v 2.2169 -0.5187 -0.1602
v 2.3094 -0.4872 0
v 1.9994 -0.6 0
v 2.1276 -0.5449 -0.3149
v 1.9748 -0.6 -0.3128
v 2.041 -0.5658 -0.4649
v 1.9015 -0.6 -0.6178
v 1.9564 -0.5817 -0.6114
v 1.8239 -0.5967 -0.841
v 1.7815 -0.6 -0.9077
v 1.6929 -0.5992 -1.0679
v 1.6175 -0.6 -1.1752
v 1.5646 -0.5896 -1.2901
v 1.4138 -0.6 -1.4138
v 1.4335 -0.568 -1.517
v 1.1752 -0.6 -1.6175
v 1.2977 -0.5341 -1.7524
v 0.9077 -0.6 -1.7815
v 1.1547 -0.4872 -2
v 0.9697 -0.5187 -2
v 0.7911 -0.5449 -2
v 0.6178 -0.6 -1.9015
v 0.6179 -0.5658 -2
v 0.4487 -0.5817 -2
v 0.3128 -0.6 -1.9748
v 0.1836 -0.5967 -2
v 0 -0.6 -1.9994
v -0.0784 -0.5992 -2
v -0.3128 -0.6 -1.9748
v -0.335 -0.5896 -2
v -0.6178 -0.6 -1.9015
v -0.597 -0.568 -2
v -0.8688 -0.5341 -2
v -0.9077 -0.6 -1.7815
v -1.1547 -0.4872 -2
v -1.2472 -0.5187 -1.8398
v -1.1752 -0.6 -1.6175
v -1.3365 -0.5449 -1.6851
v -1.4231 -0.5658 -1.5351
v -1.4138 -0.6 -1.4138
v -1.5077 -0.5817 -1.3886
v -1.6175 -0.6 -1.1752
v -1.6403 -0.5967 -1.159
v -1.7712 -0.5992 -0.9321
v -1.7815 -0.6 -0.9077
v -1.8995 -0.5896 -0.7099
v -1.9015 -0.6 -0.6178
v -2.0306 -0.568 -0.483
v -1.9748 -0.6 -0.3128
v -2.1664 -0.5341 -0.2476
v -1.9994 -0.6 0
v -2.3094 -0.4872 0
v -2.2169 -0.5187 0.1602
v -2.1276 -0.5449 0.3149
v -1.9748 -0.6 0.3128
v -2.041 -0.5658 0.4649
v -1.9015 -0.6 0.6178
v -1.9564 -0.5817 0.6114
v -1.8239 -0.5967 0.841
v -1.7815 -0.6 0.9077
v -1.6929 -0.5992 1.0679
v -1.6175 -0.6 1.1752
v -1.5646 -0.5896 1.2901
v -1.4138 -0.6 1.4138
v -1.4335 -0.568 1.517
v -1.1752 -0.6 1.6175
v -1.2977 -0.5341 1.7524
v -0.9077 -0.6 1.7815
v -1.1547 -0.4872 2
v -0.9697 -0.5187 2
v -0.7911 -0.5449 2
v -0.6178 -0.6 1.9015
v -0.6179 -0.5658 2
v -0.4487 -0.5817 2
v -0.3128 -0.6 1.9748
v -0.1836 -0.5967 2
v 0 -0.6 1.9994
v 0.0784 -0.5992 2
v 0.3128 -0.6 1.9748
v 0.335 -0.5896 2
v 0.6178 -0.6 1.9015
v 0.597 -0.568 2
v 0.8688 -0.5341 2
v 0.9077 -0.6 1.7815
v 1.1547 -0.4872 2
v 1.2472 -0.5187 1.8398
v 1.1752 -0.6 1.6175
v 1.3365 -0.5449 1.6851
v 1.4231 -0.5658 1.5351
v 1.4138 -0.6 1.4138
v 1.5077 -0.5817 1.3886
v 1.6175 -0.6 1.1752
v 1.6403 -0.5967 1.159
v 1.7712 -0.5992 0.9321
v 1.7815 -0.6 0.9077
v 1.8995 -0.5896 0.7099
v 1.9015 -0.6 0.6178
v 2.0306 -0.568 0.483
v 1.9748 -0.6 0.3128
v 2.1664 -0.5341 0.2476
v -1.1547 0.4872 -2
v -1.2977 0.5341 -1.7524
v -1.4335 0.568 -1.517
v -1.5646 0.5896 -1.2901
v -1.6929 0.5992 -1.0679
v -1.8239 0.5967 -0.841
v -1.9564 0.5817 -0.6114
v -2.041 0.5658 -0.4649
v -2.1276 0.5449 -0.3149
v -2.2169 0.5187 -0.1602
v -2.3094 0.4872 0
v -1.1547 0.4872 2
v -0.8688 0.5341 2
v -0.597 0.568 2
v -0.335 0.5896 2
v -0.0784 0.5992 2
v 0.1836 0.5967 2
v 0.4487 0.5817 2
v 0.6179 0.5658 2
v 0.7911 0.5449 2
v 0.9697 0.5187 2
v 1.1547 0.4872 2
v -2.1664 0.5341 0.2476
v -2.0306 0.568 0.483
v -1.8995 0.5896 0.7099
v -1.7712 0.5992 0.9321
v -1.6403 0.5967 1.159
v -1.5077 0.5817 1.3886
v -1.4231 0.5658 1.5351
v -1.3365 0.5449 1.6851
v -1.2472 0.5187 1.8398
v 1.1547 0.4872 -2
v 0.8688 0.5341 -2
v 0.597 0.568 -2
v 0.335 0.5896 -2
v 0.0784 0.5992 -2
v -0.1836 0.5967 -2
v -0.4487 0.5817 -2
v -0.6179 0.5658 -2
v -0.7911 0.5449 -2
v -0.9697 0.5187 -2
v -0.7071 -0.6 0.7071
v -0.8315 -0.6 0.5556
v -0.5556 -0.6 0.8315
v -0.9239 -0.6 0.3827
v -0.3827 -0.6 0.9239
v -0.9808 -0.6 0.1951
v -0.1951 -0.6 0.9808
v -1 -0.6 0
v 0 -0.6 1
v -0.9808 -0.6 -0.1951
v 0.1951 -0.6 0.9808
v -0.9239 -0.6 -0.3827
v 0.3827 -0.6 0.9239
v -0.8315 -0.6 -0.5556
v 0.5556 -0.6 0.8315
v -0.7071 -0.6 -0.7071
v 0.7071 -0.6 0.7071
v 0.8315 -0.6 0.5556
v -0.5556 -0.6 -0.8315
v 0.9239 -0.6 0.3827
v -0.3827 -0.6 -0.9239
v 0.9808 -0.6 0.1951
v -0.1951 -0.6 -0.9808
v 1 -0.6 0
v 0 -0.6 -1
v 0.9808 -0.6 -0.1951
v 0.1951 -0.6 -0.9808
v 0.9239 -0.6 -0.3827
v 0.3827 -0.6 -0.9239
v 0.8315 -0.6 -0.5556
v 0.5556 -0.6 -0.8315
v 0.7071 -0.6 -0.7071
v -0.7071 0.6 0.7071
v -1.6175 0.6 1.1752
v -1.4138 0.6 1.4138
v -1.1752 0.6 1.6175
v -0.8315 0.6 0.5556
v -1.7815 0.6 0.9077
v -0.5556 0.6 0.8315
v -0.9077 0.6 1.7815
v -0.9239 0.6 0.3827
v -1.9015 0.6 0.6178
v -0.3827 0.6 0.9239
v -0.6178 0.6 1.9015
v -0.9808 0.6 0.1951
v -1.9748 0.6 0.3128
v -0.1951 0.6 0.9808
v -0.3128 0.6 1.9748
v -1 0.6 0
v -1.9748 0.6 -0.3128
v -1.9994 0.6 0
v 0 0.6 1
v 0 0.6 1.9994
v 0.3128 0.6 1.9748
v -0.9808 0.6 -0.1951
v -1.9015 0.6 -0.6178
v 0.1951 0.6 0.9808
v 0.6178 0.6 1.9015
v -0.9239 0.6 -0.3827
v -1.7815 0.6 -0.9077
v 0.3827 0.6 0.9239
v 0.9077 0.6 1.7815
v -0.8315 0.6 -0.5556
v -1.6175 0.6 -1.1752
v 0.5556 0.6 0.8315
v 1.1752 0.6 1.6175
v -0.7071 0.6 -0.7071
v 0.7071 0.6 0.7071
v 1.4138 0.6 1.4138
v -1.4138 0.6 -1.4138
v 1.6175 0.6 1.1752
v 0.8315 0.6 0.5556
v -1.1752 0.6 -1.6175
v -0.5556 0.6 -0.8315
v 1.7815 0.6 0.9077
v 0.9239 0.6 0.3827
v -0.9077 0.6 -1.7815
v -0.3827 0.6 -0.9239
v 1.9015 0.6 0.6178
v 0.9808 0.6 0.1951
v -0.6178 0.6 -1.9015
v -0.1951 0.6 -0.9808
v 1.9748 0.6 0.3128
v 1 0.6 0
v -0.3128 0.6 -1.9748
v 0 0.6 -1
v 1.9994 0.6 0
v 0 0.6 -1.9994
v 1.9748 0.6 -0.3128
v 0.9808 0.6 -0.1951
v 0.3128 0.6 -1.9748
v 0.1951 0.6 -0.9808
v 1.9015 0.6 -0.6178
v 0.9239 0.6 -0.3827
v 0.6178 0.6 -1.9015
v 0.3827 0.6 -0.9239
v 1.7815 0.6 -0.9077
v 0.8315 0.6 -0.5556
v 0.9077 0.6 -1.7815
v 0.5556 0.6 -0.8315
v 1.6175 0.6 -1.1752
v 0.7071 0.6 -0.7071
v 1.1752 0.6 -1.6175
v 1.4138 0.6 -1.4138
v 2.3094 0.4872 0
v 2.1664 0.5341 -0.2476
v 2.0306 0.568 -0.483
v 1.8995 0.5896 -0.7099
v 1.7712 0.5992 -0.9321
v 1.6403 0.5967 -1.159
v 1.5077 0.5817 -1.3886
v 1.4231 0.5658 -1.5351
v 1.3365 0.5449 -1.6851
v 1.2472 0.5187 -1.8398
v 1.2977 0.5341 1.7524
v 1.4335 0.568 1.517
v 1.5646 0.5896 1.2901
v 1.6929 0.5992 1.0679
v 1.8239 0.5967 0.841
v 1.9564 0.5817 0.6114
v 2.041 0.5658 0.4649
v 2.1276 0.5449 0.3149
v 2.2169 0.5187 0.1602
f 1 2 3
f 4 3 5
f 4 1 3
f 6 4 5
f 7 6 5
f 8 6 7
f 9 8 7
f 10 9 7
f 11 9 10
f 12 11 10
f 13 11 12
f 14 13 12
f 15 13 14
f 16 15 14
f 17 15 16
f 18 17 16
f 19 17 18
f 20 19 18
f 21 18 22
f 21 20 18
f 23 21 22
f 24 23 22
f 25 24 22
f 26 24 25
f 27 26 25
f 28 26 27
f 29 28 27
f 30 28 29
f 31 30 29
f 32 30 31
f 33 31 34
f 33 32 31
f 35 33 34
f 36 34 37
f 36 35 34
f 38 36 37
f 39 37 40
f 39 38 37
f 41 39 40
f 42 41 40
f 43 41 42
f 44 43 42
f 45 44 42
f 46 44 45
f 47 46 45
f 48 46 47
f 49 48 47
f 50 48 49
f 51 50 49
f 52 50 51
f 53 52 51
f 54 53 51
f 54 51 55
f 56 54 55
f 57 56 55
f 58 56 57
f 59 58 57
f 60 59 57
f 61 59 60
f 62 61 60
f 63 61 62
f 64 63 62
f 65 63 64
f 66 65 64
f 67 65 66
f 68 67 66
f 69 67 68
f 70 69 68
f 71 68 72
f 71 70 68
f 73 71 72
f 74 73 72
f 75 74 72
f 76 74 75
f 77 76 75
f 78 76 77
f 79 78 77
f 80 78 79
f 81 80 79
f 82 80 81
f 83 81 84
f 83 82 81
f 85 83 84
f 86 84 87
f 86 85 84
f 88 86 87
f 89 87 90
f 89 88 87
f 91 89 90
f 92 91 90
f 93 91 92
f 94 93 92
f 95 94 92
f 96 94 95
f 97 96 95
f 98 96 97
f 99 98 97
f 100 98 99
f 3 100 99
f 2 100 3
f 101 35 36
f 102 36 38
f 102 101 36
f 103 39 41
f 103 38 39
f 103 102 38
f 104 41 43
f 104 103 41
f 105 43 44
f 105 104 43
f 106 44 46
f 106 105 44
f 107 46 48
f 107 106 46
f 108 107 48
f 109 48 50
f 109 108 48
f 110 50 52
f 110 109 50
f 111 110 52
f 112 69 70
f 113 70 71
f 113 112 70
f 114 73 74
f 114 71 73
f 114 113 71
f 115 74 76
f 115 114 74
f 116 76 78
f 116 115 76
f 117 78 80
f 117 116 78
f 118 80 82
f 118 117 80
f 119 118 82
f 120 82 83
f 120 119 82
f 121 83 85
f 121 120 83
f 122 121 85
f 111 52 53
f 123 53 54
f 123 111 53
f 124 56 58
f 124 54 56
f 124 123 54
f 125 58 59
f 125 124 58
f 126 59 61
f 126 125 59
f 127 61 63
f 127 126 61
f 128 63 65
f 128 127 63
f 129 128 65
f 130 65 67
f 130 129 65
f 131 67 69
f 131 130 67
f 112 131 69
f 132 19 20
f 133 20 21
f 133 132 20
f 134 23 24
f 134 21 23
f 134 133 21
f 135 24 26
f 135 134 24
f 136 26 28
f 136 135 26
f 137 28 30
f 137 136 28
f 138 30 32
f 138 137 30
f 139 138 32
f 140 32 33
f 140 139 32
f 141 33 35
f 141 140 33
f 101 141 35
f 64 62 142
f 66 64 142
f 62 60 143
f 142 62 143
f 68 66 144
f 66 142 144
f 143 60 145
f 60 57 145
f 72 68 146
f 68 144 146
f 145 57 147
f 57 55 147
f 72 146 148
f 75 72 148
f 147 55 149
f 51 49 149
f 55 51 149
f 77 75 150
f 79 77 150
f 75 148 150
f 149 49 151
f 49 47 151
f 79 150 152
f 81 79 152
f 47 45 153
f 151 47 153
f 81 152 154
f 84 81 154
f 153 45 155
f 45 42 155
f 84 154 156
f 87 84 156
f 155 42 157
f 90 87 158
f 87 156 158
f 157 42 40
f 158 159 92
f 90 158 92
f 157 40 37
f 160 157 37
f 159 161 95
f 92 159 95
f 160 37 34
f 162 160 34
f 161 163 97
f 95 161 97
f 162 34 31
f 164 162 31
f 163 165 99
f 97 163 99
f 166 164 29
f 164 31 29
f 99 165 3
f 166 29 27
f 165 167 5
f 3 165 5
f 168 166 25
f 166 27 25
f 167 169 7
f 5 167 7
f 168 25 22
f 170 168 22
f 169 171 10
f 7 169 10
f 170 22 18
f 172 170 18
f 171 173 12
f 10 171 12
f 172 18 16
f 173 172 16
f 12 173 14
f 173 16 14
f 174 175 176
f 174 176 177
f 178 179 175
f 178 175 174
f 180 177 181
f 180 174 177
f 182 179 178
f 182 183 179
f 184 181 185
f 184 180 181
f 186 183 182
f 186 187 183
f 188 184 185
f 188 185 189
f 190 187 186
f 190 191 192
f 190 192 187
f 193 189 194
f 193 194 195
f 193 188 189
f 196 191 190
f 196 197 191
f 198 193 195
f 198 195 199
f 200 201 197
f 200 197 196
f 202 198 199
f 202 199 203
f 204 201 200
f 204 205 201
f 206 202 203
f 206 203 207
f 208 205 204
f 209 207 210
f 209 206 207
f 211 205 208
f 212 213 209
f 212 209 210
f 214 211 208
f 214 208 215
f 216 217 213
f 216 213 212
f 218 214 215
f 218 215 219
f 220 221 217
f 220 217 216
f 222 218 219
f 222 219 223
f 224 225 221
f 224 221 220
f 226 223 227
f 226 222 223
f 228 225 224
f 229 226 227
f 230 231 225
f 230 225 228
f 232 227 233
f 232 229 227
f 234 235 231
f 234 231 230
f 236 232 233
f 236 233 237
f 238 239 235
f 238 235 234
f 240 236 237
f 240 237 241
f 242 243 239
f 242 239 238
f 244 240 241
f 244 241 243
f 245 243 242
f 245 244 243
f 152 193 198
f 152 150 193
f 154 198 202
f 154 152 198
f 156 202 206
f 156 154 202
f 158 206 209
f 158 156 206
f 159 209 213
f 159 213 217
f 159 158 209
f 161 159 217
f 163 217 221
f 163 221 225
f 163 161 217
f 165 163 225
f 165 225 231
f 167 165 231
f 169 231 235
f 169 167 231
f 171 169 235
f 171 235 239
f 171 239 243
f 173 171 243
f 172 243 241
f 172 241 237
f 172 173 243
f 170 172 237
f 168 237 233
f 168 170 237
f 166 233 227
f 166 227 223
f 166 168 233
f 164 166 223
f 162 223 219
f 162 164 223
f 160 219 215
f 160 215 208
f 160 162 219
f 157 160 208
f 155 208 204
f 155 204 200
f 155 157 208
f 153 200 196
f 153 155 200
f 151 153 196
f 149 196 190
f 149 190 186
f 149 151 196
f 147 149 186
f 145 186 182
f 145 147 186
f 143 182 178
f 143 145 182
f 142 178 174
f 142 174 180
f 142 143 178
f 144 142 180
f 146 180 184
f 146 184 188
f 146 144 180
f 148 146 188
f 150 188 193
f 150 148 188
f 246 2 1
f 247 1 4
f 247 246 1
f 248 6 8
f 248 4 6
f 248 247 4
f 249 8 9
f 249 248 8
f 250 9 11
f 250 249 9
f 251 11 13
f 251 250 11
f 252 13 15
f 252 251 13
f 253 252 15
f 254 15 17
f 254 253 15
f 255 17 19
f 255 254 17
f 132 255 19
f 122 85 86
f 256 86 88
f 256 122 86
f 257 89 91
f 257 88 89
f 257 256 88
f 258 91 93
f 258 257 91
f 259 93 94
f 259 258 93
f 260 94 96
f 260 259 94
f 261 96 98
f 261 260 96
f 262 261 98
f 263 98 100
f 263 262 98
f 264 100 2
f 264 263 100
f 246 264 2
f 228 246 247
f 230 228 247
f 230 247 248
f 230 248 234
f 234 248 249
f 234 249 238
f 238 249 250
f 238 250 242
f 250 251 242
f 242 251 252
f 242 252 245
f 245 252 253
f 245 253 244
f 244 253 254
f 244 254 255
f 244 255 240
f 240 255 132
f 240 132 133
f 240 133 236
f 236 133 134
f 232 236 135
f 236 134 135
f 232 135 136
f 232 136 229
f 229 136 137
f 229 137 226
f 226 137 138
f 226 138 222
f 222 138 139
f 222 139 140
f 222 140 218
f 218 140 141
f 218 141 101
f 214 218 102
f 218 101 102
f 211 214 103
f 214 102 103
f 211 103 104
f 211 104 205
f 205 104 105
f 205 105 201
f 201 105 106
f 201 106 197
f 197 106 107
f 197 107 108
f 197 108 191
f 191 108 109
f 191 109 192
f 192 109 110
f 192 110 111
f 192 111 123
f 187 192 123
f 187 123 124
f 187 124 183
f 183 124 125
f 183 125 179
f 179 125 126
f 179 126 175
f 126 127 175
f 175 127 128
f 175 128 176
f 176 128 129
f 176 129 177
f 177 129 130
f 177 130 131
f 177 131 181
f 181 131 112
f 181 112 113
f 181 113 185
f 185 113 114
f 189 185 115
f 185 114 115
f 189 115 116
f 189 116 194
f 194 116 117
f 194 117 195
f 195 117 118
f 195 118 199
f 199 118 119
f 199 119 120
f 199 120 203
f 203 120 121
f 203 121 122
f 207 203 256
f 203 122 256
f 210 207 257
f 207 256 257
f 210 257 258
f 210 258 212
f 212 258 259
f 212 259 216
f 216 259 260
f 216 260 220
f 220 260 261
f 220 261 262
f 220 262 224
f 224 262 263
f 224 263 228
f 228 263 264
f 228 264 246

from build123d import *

# Parameters (mm, degrees)
SKETCH2_R           = 1
BOSS_EXTRUDE1_DEPTH = 0.6


with BuildPart() as part:
    # Sketch2 → Boss-Extrude1 (new, symmetric)
    with BuildSketch(Plane(origin=(0, 0, 0), x_dir=(1, 0, 0), z_dir=(0, 1, 0))):
        Polygon((2.309401077, 0), (1.154700538, 2), (-1.154700538, 2), (-2.309401077, 0), (-1.154700538, -2), (1.154700538, -2), align=None)
        with Locations(Location((0, 0, 0), (0, 0, 270))):
            Circle(SKETCH2_R, mode=Mode.SUBTRACT)
    extrude(amount=BOSS_EXTRUDE1_DEPTH, both=True)

    # Sketch3 → Cut-Revolve1 (revolve, cut)
    with BuildSketch(Plane.XY, mode=Mode.PRIVATE) as cut_revolve1_sk:
        Polygon((-2.309401077, 0.6), (-1.999401077, 0.6), (-2.309401077, 0.487169227), align=None)
        Polygon((-1.999401077, -0.6), (-2.309401077, -0.487169227), (-2.309401077, -0.6), align=None)
    revolve(cut_revolve1_sk.sketch.rotate(Axis((0, 0, 0), (0, 1, 0)), 180), axis=Axis((0, 0, 0), (0, 1, 0)), mode=Mode.SUBTRACT)


solid = part.part
